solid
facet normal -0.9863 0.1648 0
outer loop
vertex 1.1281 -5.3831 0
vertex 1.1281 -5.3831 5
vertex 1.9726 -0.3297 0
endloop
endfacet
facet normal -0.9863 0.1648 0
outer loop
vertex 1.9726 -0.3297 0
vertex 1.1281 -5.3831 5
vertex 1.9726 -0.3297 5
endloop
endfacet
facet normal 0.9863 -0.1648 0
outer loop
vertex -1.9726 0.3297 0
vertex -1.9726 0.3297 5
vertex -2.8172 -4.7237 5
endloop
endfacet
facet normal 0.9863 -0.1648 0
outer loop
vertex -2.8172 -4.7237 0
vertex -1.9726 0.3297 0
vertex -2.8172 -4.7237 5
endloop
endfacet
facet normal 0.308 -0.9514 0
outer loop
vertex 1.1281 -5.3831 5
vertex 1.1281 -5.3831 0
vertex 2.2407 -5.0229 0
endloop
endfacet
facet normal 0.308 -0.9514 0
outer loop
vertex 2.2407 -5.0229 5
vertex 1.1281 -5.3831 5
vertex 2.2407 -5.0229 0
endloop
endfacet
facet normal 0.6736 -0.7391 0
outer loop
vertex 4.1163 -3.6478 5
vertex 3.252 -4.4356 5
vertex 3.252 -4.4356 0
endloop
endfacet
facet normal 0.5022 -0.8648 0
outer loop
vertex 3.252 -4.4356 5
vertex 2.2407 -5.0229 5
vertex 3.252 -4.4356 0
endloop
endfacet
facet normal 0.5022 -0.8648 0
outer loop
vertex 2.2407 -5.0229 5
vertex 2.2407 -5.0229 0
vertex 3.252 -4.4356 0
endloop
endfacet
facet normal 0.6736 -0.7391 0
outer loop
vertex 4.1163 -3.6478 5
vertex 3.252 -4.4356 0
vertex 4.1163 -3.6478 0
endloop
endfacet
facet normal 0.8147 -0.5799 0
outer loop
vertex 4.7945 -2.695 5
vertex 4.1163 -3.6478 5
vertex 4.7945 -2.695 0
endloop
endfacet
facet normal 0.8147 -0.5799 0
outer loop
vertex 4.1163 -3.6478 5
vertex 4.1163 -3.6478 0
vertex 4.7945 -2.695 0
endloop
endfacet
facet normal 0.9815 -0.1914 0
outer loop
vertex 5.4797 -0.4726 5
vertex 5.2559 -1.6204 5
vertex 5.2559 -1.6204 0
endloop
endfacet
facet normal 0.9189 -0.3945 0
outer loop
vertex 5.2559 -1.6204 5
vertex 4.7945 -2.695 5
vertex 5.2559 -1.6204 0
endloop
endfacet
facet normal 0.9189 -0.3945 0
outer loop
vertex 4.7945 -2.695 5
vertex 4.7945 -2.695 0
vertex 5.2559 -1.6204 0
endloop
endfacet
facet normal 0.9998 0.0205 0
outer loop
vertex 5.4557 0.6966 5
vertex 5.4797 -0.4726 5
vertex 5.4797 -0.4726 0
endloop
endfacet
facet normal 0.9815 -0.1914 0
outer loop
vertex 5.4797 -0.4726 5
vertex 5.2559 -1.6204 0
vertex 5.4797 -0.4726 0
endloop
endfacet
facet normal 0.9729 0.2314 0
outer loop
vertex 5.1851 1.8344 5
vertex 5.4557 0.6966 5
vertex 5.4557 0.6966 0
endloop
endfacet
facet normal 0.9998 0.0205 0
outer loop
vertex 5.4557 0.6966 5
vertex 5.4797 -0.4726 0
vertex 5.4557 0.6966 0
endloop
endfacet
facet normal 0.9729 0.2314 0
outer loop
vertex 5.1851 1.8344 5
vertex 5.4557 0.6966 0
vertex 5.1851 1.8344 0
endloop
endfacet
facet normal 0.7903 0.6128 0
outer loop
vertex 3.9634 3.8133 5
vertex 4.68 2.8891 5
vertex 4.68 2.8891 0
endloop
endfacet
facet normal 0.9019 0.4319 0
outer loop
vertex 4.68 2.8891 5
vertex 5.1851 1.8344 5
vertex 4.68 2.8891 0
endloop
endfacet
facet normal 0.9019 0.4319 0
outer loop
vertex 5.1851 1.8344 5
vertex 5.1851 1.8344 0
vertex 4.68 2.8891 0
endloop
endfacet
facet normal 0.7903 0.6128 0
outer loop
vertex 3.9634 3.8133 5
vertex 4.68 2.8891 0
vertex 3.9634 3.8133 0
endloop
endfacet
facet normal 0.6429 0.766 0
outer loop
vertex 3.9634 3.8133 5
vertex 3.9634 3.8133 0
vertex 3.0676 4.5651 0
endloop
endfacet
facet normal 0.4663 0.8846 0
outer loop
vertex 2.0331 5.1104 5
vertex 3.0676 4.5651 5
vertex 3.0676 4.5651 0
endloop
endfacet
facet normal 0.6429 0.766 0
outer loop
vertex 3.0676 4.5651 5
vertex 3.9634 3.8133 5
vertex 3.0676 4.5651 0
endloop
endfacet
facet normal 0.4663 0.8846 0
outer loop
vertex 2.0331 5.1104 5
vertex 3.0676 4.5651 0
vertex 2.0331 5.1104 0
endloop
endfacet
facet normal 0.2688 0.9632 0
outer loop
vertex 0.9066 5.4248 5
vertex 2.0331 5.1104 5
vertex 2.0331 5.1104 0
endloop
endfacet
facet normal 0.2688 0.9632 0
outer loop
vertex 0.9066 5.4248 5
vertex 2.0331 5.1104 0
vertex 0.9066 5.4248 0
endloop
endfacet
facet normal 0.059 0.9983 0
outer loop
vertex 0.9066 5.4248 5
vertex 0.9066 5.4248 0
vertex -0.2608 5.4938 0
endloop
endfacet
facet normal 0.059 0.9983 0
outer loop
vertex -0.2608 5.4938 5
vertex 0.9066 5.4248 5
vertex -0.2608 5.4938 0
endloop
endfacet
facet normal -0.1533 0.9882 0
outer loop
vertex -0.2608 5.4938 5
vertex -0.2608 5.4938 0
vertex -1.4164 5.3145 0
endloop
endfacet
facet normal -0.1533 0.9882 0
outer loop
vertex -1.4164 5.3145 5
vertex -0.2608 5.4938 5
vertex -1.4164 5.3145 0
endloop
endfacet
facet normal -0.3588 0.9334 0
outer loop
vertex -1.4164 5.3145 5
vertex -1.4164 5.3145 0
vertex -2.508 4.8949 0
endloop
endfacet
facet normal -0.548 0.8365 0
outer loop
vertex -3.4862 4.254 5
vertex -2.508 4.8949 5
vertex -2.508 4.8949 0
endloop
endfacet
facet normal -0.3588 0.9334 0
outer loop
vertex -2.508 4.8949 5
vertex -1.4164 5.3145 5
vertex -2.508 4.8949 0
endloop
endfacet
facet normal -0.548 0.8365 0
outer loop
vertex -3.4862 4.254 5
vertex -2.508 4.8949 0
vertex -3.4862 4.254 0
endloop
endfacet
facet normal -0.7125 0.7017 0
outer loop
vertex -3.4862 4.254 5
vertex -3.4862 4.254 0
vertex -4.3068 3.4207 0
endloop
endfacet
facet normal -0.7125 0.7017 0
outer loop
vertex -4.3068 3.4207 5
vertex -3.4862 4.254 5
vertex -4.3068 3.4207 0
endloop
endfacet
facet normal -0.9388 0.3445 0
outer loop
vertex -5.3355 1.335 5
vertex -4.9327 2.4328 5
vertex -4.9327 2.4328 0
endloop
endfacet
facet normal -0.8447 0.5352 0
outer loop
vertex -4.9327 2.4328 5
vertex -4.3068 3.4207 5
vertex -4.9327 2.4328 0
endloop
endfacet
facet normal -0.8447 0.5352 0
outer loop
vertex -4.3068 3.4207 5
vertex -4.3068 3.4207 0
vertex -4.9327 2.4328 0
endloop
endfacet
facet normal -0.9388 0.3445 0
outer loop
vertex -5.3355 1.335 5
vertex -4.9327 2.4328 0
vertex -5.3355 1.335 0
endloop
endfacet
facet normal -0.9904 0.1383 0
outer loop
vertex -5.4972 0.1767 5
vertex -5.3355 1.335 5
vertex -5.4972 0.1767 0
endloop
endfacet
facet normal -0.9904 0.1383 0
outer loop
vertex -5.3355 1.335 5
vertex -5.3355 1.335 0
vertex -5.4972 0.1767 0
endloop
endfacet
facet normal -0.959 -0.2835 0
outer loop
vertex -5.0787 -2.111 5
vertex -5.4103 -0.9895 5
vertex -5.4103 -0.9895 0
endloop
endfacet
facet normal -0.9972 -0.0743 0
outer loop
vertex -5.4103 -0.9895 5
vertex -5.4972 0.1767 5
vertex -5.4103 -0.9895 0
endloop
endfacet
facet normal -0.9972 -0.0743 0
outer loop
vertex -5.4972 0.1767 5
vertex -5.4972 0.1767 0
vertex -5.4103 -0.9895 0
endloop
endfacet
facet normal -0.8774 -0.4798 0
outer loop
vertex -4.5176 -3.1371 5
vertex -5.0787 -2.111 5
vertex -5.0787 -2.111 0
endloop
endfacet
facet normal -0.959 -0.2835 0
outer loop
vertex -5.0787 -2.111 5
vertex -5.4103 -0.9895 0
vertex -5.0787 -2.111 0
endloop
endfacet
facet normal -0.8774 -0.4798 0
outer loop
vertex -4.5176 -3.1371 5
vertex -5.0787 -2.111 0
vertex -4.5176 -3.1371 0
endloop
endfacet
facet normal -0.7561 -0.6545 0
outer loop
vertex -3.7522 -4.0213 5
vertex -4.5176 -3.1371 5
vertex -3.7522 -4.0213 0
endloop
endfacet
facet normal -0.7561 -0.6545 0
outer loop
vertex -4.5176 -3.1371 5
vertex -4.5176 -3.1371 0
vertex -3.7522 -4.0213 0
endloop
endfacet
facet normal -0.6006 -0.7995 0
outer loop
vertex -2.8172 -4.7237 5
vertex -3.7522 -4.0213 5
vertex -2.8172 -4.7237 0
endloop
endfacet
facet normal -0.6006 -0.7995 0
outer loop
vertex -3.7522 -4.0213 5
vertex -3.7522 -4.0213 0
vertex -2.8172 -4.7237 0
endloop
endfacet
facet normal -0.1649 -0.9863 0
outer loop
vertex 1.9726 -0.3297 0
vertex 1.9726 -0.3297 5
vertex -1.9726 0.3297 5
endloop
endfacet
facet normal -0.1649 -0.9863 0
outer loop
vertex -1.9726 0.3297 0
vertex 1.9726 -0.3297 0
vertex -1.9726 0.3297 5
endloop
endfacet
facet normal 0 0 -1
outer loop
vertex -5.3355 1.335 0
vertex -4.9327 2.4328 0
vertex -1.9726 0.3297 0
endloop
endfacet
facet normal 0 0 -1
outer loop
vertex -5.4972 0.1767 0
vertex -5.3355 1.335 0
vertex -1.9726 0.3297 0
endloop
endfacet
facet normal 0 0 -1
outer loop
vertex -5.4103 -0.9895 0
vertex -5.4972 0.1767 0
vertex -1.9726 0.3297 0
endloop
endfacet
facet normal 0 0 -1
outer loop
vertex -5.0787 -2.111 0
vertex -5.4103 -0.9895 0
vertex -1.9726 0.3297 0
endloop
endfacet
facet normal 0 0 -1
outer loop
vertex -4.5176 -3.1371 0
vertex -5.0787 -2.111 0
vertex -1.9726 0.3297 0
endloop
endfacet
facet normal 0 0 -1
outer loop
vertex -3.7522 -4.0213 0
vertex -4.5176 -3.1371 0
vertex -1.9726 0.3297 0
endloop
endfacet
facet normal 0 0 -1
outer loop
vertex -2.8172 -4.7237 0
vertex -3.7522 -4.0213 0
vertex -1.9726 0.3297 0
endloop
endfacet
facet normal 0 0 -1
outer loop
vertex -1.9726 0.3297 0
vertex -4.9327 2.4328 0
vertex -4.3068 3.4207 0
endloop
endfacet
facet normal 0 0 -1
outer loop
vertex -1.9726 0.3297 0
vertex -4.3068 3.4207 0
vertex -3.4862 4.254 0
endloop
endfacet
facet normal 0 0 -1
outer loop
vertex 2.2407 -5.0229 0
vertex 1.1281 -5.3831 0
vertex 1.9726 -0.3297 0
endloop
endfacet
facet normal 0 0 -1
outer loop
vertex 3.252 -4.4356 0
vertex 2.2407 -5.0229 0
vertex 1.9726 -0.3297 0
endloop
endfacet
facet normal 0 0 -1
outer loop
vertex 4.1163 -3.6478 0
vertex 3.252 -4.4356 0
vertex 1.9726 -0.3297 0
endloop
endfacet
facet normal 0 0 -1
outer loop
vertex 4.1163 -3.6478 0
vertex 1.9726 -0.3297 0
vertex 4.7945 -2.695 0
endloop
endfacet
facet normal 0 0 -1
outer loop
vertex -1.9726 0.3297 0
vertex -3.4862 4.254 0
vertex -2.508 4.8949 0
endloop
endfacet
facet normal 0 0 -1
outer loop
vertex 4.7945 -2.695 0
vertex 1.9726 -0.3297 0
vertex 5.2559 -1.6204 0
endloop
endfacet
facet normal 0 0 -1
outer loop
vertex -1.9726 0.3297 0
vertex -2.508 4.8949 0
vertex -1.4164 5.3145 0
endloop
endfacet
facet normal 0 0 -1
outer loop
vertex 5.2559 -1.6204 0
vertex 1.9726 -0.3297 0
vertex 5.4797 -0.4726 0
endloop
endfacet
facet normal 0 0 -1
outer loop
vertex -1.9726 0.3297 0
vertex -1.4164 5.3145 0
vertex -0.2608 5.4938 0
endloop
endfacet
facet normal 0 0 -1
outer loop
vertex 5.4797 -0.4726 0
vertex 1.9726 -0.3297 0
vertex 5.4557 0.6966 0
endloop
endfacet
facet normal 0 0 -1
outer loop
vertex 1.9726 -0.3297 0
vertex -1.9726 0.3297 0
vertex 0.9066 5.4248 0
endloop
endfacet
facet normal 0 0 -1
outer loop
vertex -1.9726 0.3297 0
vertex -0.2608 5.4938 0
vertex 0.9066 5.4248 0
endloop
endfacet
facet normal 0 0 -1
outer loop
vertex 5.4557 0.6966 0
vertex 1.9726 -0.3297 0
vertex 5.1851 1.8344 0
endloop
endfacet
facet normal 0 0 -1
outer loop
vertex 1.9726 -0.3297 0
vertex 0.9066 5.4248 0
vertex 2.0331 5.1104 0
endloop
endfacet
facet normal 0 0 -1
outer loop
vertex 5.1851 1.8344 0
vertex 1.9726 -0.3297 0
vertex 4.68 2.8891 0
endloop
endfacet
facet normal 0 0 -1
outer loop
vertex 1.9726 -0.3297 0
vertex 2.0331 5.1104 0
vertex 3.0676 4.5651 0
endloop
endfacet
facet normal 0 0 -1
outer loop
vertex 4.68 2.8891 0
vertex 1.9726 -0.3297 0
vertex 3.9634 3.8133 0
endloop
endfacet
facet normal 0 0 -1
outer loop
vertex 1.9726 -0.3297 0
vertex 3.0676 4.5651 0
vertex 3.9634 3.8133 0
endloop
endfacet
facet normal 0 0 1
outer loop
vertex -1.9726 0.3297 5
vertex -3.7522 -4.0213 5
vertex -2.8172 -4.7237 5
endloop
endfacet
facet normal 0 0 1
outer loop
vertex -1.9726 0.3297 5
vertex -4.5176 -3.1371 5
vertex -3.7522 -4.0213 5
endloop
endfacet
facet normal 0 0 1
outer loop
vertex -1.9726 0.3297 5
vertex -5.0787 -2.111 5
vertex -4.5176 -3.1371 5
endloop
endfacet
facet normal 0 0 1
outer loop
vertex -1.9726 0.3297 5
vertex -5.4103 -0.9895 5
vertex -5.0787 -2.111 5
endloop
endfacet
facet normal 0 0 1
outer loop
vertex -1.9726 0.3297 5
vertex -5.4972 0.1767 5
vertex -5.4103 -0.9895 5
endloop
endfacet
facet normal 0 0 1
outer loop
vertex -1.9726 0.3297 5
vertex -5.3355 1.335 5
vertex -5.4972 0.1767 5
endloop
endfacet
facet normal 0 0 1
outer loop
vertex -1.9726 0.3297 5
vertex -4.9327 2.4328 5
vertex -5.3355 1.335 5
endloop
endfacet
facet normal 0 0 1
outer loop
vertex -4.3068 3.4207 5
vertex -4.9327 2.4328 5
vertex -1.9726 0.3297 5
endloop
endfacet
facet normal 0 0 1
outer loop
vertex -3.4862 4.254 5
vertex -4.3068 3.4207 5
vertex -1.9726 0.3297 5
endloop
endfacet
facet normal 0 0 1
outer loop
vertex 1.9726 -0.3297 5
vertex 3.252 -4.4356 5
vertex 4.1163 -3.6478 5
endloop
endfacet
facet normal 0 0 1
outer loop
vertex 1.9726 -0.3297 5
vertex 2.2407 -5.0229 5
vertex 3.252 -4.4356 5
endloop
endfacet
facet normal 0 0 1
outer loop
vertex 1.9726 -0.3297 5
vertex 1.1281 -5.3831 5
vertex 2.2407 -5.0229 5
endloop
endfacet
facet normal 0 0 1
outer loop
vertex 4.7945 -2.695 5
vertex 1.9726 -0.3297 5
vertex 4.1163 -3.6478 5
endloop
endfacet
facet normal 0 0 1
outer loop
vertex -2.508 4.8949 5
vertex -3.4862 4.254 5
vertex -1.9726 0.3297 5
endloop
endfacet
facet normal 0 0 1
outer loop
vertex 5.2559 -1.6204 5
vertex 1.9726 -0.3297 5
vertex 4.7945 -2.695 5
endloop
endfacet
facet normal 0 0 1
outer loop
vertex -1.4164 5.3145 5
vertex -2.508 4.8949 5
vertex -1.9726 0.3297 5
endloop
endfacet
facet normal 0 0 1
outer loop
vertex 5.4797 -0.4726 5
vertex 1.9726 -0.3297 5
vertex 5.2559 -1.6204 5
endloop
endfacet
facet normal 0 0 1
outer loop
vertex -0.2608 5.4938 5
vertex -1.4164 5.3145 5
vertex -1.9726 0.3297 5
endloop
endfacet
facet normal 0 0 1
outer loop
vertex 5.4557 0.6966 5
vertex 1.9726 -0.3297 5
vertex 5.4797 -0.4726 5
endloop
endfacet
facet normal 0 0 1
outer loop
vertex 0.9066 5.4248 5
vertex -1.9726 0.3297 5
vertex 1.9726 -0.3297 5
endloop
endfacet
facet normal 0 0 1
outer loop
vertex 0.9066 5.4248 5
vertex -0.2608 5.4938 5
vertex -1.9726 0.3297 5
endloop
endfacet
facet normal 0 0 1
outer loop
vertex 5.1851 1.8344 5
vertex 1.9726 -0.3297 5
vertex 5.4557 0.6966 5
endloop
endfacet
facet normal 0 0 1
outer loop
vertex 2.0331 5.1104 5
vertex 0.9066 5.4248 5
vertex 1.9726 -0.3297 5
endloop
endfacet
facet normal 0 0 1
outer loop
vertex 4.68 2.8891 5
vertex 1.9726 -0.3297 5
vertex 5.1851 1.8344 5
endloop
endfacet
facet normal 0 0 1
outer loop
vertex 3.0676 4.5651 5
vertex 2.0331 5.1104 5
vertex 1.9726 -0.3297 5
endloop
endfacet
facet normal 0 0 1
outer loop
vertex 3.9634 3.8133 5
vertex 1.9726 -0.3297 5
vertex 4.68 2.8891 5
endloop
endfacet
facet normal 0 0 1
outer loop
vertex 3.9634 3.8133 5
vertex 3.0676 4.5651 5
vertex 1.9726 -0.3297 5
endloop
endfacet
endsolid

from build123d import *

# Parameters (mm, degrees)
SKETCH1_R           = 5.5
BOSS_EXTRUDE1_DEPTH = 5
CUT_EXTRUDE3_DEPTH  = 5


with BuildPart() as part:
    # Sketch1 → Boss-Extrude1 (new body)
    with BuildSketch(Plane.XY):
        Circle(SKETCH1_R)
    extrude(amount=BOSS_EXTRUDE1_DEPTH)

    # Sketch2 → Cut-Extrude3 (cut)
    with BuildSketch(Plane.XY.offset(5)):
        with BuildLine():
            Line((0, 0), (-1.972639316, 0.329687929))
            Line((-1.972639316, 0.329687929), (-2.817213309, -4.723696558))
            add(Edge.make_bspline(
                [(-2.817213309, -4.723696558), (-2.331717092, -5.013604459), (-1.497847825, -5.349651617), (-0.517167494, -5.488823483), (0.280656275, -5.510097286), (0.757829967, -5.460753651), (1.128065322, -5.383072415)],
                knots=[0, 0, 0, 0, 0.414681005, 0.650712608, 0.722388742, 1, 1, 1, 1], degree=3))
            Line((1.128065322, -5.383072415), (1.972639316, -0.329687929))
            Line((1.972639316, -0.329687929), (0, 0))
        make_face()
    extrude(amount=-CUT_EXTRUDE3_DEPTH, mode=Mode.SUBTRACT)


with BuildPart() as cut_extrude3_kept_piece:
    # of the separate pieces the step leaves, the one the design keeps (cut_extrude3_pieces_kept)
    add(part.part.solids().sort_by_distance((1.128065322, -5.383072415, 0))[0])


solid = cut_extrude3_kept_piece.part
